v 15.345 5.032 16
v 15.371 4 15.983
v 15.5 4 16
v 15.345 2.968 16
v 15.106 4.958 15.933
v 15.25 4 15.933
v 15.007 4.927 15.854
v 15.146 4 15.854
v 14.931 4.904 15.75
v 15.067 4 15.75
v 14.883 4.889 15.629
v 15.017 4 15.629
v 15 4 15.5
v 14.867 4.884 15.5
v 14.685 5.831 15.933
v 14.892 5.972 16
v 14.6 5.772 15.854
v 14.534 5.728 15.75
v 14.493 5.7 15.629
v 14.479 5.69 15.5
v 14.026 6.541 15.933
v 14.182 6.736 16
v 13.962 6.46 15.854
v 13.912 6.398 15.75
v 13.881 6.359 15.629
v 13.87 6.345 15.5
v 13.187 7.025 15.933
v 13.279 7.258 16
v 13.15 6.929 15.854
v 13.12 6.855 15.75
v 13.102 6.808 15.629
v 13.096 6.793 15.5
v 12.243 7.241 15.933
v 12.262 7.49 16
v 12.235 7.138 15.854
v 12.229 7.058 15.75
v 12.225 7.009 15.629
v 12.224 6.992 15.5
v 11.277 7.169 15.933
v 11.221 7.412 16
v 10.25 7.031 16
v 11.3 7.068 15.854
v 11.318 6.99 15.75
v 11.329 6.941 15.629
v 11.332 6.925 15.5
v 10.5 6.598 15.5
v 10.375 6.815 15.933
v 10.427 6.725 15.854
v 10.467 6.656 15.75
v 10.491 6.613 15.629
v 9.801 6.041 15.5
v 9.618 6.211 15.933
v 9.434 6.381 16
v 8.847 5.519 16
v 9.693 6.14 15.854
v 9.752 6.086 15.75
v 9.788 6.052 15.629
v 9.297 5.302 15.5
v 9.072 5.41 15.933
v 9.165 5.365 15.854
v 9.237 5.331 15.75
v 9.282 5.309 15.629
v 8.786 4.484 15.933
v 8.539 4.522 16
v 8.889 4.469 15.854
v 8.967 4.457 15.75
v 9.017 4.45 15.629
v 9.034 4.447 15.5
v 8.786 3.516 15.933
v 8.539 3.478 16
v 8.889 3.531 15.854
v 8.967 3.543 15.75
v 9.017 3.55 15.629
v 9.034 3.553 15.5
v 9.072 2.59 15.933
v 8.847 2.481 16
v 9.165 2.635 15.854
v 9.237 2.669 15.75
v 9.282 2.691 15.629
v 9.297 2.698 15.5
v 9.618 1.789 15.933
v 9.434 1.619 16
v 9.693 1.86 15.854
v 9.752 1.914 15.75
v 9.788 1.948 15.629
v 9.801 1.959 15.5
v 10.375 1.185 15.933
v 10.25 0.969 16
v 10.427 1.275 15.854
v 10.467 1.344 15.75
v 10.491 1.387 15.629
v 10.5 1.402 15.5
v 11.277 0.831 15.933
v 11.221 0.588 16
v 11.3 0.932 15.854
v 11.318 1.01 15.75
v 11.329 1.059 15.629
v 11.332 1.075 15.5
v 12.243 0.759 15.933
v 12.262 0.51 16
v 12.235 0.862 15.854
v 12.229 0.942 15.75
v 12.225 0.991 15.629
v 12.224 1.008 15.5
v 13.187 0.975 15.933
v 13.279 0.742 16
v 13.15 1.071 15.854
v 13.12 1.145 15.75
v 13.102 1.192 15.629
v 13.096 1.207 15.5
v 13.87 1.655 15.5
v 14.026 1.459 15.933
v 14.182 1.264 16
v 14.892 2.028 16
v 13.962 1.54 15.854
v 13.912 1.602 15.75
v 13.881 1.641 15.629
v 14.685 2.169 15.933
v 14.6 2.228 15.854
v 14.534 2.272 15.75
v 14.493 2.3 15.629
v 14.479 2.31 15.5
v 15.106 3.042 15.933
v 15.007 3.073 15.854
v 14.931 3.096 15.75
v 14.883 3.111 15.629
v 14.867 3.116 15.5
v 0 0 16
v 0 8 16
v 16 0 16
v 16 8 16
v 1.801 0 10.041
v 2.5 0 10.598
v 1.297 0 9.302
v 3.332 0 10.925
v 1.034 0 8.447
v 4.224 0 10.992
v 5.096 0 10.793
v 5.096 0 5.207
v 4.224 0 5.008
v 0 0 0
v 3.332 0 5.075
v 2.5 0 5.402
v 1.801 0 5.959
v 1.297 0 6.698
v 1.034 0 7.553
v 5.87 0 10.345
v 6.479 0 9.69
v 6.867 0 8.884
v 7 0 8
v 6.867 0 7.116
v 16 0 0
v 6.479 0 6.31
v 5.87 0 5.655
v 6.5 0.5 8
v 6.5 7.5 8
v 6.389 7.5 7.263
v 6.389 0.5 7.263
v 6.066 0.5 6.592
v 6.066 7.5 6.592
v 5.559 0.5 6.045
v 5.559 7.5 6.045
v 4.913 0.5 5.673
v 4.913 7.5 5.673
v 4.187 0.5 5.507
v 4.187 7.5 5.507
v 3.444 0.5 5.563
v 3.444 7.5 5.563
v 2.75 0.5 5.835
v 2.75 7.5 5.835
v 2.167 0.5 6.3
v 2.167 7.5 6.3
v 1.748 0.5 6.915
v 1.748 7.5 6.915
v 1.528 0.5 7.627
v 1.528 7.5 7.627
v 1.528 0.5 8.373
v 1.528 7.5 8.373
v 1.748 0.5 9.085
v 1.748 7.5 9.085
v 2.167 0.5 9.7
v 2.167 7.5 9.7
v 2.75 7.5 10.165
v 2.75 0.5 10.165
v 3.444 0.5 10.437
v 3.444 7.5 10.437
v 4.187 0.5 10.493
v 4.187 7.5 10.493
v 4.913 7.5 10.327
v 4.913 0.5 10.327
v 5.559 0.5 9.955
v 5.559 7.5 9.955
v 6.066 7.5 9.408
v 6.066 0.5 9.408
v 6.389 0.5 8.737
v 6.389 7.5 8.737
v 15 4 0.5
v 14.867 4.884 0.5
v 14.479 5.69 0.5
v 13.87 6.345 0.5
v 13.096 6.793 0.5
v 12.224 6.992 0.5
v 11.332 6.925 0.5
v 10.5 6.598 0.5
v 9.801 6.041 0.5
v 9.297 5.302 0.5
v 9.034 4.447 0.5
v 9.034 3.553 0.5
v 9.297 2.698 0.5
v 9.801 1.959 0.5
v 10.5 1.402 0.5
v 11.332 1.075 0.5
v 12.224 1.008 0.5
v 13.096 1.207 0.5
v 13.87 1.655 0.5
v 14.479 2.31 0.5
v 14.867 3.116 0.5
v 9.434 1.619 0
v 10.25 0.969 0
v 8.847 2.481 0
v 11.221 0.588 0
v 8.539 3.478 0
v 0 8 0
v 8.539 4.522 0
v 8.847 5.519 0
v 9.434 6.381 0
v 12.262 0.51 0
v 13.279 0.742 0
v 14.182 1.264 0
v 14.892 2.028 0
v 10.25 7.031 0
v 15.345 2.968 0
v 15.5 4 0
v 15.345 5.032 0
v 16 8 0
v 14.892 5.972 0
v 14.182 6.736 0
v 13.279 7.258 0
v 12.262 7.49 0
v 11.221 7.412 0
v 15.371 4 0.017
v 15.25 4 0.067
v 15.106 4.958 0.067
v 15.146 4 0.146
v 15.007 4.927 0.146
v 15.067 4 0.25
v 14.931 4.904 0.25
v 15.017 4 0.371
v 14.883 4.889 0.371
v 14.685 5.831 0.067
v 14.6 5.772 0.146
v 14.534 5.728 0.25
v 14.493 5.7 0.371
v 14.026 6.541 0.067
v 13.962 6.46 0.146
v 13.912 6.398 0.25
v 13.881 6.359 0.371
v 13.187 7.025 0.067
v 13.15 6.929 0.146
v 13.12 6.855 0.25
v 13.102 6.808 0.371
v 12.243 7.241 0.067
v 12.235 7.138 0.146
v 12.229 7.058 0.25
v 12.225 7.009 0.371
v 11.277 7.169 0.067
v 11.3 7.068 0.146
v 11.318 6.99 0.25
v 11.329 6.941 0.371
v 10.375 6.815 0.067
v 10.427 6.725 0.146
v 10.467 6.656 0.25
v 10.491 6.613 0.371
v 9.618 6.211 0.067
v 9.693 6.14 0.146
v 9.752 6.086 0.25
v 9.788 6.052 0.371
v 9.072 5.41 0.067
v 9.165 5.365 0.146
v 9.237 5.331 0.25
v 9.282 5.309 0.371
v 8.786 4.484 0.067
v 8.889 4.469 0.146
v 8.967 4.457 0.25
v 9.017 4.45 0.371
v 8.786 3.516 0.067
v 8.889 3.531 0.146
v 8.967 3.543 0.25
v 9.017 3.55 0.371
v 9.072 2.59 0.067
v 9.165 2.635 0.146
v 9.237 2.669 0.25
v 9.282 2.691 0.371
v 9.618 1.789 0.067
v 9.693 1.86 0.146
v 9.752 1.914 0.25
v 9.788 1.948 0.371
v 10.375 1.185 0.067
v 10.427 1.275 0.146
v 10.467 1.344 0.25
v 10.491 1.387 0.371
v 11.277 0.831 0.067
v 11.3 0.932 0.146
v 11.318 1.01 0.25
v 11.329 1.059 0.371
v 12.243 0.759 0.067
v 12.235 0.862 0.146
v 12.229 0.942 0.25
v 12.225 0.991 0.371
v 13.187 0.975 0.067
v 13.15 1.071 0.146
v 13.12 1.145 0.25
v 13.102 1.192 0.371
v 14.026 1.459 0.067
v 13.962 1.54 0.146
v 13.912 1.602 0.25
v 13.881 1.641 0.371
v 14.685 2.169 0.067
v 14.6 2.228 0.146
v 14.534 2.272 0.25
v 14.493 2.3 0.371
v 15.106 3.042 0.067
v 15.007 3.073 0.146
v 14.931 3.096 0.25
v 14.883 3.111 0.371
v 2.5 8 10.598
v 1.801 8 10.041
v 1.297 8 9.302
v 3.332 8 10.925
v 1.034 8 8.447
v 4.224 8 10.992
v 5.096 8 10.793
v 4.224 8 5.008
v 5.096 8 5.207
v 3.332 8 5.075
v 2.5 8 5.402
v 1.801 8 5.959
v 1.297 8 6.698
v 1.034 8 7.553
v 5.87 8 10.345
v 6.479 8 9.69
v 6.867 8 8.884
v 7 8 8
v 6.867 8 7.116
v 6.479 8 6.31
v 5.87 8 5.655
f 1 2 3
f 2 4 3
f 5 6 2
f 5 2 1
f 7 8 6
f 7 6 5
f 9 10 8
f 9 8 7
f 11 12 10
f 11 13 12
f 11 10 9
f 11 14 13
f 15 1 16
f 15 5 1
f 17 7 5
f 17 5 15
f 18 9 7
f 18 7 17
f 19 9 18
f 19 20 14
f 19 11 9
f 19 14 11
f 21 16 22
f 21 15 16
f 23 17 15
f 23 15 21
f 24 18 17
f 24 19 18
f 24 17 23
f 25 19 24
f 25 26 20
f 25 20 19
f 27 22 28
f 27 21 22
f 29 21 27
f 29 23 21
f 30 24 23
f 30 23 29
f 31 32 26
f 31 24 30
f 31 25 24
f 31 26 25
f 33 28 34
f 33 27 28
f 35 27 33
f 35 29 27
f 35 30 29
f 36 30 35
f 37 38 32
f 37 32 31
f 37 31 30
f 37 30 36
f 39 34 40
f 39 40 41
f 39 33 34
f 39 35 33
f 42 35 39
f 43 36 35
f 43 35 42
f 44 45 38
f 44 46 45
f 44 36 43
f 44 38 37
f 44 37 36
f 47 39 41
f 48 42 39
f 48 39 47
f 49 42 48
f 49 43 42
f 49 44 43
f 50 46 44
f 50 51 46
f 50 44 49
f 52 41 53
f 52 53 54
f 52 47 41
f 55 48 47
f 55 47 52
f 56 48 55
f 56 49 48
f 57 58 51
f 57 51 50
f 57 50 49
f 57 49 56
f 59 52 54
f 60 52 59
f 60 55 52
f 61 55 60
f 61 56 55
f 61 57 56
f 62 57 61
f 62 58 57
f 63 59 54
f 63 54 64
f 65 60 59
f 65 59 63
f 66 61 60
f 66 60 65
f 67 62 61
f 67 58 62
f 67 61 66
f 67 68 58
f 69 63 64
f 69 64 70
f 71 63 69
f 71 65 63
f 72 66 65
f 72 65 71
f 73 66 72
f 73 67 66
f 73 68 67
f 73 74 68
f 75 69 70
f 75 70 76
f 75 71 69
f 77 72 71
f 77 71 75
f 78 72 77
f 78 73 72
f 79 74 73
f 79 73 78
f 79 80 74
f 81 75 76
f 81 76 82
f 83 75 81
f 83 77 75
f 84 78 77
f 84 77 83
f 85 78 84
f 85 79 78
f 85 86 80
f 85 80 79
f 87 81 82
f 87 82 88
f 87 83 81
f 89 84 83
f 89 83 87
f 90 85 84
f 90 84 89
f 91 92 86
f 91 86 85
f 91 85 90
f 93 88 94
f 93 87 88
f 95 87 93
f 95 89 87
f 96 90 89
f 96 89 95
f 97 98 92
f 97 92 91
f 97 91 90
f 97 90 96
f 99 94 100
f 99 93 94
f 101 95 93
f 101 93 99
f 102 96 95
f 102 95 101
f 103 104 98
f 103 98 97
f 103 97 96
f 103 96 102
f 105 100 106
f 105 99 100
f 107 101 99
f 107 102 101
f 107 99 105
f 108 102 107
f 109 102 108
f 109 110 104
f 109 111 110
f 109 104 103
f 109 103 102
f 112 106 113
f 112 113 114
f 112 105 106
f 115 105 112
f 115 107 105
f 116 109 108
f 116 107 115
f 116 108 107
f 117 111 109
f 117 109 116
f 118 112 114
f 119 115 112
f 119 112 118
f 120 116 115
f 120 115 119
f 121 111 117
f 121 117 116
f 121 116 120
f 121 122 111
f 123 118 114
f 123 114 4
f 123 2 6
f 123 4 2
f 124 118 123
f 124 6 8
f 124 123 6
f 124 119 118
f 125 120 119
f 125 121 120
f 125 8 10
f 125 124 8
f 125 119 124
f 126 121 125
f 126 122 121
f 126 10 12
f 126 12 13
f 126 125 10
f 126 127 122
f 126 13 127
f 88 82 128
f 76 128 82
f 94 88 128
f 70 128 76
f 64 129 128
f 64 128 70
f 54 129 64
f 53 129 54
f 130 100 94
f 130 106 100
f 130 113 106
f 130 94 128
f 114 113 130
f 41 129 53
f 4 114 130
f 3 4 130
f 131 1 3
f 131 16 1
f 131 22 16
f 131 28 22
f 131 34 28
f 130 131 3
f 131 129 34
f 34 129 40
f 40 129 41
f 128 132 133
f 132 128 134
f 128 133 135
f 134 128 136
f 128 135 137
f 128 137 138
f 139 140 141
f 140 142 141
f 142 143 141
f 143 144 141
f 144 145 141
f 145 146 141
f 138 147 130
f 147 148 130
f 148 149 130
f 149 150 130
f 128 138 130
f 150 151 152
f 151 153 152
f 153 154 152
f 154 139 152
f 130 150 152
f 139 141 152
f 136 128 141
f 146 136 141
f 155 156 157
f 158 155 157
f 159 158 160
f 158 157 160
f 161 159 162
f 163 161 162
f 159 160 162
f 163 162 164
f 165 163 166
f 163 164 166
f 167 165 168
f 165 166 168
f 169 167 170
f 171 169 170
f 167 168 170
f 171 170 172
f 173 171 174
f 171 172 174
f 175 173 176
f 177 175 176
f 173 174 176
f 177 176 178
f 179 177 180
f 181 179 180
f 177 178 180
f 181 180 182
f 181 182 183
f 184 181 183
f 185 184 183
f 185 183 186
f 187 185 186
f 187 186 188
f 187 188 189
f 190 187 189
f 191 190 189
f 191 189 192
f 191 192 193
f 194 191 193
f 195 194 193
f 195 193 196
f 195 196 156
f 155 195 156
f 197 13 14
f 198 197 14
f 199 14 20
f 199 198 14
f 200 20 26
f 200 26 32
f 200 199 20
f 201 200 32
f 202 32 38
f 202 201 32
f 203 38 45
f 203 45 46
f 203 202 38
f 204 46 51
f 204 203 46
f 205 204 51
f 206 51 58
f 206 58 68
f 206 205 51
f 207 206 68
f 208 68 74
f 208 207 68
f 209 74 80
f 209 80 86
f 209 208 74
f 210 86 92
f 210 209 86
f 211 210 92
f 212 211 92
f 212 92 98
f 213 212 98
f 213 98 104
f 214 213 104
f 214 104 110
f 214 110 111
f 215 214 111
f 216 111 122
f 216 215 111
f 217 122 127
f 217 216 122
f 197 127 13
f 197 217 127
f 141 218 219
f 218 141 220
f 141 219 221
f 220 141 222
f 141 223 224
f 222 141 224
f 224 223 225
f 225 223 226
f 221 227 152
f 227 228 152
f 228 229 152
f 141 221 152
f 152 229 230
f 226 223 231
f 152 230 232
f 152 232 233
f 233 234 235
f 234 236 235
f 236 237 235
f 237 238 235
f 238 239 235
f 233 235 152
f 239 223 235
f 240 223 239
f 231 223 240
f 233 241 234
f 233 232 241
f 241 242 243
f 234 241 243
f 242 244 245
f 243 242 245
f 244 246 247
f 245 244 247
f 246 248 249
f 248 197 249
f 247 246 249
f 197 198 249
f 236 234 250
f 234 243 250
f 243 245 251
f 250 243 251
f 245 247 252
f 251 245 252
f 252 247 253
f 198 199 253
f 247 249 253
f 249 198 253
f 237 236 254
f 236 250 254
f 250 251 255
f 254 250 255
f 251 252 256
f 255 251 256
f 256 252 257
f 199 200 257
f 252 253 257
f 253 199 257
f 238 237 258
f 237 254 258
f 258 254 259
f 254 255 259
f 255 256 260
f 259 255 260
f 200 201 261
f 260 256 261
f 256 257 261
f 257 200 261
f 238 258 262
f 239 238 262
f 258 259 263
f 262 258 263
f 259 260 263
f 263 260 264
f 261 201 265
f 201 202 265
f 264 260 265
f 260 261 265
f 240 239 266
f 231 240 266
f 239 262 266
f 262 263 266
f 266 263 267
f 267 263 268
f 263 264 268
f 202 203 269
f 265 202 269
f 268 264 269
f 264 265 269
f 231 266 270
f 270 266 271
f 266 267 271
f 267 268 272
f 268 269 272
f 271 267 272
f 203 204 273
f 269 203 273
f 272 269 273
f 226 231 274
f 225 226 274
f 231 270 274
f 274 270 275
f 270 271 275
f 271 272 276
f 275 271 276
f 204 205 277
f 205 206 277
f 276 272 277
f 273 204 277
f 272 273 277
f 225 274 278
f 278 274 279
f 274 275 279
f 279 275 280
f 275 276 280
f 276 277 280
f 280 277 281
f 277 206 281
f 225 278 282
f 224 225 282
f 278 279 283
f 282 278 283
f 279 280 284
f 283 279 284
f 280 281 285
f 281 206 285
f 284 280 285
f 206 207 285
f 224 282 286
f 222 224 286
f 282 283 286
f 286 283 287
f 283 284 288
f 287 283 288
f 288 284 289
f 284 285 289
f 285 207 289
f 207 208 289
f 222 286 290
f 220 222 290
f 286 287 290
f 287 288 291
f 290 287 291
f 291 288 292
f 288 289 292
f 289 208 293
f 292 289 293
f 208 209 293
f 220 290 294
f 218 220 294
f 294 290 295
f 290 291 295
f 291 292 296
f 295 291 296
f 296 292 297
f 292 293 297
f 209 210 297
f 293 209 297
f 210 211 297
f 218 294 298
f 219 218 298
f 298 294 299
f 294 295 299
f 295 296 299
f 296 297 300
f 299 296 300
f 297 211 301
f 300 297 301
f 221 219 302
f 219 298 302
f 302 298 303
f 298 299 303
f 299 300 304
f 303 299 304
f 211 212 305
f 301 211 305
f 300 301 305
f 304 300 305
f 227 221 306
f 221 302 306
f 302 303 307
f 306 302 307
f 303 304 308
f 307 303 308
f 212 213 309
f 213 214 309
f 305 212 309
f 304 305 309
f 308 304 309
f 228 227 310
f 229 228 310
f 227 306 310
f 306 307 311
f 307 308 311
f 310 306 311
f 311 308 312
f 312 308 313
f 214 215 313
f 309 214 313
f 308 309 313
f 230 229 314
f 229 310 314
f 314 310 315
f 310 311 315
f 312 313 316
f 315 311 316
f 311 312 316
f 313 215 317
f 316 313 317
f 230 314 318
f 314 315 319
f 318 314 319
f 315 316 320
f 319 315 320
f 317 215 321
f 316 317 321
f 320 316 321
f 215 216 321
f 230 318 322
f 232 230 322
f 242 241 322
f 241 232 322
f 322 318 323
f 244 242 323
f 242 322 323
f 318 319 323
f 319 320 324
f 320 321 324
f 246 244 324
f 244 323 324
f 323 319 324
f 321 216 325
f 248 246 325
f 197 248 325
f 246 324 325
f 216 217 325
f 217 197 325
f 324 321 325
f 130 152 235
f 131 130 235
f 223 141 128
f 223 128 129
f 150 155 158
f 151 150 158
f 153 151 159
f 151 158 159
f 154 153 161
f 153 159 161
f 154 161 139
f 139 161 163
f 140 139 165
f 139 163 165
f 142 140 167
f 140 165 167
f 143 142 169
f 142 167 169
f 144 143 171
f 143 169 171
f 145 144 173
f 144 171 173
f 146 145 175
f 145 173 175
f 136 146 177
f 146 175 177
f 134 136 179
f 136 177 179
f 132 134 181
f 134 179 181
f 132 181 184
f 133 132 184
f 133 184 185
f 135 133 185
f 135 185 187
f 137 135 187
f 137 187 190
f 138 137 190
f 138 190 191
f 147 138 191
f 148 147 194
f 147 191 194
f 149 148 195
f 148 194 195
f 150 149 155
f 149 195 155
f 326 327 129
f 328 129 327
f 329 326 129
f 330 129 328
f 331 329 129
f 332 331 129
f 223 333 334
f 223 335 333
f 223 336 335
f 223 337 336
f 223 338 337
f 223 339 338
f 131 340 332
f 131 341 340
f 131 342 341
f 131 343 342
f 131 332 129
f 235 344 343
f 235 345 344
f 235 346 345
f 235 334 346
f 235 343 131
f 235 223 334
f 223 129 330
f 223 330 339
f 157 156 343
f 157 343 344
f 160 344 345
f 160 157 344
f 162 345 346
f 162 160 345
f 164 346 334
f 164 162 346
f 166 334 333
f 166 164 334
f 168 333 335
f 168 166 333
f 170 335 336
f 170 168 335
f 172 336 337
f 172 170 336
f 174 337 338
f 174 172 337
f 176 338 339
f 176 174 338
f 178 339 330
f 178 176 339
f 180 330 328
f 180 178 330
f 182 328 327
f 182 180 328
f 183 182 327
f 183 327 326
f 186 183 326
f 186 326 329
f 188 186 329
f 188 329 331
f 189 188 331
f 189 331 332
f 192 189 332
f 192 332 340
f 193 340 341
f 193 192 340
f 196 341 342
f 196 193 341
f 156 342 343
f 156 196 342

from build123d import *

# Parameters (mm, degrees)
ESQUISSE1_W             = 16
ESQUISSE1_H             = 8
ESQUISSE1_R             = 3
BOSS_EXTRU_1_DEPTH      = 16
ESQUISSE2_R             = 2.5
ENL_V_MAT_EXTRU_1_DEPTH = 9
CHANFREIN1_SIZE         = 0.5
CONG_1_R                = 0.5


with BuildPart() as part:
    # Esquisse1 → Boss.-Extru.1 (new body)
    with BuildSketch(Plane.XY):
        with Locations((8, 4)):
            Rectangle(ESQUISSE1_W, ESQUISSE1_H)
        with Locations((12, 4)):
            Circle(ESQUISSE1_R, mode=Mode.SUBTRACT)
    extrude(amount=BOSS_EXTRU_1_DEPTH)

    # Esquisse2 → Enlèv. mat.-Extru.1 (cut, through all)
    with BuildSketch(Plane(origin=(0, 8, 0), x_dir=(1, 0, 0), z_dir=(0, 1, 0))):
        with Locations((4, -8)):
            Circle(ESQUISSE2_R)
    extrude(amount=-ENL_V_MAT_EXTRU_1_DEPTH, mode=Mode.SUBTRACT)

    # Chanfrein1
    chanfrein1_edges = [part.edges().sort_by_distance(p)[0] for p in [
        (1.5, 0, 8),
        (1.5, 8, 8),
    ]]
    chamfer(chanfrein1_edges, length=CHANFREIN1_SIZE)

    # Congé1
    cong_1_edges = [part.edges().sort_by_distance(p)[0] for p in [
        (9, 4, 0),
        (9, 4, 16),
    ]]
    fillet(cong_1_edges, radius=CONG_1_R)


solid = part.part
